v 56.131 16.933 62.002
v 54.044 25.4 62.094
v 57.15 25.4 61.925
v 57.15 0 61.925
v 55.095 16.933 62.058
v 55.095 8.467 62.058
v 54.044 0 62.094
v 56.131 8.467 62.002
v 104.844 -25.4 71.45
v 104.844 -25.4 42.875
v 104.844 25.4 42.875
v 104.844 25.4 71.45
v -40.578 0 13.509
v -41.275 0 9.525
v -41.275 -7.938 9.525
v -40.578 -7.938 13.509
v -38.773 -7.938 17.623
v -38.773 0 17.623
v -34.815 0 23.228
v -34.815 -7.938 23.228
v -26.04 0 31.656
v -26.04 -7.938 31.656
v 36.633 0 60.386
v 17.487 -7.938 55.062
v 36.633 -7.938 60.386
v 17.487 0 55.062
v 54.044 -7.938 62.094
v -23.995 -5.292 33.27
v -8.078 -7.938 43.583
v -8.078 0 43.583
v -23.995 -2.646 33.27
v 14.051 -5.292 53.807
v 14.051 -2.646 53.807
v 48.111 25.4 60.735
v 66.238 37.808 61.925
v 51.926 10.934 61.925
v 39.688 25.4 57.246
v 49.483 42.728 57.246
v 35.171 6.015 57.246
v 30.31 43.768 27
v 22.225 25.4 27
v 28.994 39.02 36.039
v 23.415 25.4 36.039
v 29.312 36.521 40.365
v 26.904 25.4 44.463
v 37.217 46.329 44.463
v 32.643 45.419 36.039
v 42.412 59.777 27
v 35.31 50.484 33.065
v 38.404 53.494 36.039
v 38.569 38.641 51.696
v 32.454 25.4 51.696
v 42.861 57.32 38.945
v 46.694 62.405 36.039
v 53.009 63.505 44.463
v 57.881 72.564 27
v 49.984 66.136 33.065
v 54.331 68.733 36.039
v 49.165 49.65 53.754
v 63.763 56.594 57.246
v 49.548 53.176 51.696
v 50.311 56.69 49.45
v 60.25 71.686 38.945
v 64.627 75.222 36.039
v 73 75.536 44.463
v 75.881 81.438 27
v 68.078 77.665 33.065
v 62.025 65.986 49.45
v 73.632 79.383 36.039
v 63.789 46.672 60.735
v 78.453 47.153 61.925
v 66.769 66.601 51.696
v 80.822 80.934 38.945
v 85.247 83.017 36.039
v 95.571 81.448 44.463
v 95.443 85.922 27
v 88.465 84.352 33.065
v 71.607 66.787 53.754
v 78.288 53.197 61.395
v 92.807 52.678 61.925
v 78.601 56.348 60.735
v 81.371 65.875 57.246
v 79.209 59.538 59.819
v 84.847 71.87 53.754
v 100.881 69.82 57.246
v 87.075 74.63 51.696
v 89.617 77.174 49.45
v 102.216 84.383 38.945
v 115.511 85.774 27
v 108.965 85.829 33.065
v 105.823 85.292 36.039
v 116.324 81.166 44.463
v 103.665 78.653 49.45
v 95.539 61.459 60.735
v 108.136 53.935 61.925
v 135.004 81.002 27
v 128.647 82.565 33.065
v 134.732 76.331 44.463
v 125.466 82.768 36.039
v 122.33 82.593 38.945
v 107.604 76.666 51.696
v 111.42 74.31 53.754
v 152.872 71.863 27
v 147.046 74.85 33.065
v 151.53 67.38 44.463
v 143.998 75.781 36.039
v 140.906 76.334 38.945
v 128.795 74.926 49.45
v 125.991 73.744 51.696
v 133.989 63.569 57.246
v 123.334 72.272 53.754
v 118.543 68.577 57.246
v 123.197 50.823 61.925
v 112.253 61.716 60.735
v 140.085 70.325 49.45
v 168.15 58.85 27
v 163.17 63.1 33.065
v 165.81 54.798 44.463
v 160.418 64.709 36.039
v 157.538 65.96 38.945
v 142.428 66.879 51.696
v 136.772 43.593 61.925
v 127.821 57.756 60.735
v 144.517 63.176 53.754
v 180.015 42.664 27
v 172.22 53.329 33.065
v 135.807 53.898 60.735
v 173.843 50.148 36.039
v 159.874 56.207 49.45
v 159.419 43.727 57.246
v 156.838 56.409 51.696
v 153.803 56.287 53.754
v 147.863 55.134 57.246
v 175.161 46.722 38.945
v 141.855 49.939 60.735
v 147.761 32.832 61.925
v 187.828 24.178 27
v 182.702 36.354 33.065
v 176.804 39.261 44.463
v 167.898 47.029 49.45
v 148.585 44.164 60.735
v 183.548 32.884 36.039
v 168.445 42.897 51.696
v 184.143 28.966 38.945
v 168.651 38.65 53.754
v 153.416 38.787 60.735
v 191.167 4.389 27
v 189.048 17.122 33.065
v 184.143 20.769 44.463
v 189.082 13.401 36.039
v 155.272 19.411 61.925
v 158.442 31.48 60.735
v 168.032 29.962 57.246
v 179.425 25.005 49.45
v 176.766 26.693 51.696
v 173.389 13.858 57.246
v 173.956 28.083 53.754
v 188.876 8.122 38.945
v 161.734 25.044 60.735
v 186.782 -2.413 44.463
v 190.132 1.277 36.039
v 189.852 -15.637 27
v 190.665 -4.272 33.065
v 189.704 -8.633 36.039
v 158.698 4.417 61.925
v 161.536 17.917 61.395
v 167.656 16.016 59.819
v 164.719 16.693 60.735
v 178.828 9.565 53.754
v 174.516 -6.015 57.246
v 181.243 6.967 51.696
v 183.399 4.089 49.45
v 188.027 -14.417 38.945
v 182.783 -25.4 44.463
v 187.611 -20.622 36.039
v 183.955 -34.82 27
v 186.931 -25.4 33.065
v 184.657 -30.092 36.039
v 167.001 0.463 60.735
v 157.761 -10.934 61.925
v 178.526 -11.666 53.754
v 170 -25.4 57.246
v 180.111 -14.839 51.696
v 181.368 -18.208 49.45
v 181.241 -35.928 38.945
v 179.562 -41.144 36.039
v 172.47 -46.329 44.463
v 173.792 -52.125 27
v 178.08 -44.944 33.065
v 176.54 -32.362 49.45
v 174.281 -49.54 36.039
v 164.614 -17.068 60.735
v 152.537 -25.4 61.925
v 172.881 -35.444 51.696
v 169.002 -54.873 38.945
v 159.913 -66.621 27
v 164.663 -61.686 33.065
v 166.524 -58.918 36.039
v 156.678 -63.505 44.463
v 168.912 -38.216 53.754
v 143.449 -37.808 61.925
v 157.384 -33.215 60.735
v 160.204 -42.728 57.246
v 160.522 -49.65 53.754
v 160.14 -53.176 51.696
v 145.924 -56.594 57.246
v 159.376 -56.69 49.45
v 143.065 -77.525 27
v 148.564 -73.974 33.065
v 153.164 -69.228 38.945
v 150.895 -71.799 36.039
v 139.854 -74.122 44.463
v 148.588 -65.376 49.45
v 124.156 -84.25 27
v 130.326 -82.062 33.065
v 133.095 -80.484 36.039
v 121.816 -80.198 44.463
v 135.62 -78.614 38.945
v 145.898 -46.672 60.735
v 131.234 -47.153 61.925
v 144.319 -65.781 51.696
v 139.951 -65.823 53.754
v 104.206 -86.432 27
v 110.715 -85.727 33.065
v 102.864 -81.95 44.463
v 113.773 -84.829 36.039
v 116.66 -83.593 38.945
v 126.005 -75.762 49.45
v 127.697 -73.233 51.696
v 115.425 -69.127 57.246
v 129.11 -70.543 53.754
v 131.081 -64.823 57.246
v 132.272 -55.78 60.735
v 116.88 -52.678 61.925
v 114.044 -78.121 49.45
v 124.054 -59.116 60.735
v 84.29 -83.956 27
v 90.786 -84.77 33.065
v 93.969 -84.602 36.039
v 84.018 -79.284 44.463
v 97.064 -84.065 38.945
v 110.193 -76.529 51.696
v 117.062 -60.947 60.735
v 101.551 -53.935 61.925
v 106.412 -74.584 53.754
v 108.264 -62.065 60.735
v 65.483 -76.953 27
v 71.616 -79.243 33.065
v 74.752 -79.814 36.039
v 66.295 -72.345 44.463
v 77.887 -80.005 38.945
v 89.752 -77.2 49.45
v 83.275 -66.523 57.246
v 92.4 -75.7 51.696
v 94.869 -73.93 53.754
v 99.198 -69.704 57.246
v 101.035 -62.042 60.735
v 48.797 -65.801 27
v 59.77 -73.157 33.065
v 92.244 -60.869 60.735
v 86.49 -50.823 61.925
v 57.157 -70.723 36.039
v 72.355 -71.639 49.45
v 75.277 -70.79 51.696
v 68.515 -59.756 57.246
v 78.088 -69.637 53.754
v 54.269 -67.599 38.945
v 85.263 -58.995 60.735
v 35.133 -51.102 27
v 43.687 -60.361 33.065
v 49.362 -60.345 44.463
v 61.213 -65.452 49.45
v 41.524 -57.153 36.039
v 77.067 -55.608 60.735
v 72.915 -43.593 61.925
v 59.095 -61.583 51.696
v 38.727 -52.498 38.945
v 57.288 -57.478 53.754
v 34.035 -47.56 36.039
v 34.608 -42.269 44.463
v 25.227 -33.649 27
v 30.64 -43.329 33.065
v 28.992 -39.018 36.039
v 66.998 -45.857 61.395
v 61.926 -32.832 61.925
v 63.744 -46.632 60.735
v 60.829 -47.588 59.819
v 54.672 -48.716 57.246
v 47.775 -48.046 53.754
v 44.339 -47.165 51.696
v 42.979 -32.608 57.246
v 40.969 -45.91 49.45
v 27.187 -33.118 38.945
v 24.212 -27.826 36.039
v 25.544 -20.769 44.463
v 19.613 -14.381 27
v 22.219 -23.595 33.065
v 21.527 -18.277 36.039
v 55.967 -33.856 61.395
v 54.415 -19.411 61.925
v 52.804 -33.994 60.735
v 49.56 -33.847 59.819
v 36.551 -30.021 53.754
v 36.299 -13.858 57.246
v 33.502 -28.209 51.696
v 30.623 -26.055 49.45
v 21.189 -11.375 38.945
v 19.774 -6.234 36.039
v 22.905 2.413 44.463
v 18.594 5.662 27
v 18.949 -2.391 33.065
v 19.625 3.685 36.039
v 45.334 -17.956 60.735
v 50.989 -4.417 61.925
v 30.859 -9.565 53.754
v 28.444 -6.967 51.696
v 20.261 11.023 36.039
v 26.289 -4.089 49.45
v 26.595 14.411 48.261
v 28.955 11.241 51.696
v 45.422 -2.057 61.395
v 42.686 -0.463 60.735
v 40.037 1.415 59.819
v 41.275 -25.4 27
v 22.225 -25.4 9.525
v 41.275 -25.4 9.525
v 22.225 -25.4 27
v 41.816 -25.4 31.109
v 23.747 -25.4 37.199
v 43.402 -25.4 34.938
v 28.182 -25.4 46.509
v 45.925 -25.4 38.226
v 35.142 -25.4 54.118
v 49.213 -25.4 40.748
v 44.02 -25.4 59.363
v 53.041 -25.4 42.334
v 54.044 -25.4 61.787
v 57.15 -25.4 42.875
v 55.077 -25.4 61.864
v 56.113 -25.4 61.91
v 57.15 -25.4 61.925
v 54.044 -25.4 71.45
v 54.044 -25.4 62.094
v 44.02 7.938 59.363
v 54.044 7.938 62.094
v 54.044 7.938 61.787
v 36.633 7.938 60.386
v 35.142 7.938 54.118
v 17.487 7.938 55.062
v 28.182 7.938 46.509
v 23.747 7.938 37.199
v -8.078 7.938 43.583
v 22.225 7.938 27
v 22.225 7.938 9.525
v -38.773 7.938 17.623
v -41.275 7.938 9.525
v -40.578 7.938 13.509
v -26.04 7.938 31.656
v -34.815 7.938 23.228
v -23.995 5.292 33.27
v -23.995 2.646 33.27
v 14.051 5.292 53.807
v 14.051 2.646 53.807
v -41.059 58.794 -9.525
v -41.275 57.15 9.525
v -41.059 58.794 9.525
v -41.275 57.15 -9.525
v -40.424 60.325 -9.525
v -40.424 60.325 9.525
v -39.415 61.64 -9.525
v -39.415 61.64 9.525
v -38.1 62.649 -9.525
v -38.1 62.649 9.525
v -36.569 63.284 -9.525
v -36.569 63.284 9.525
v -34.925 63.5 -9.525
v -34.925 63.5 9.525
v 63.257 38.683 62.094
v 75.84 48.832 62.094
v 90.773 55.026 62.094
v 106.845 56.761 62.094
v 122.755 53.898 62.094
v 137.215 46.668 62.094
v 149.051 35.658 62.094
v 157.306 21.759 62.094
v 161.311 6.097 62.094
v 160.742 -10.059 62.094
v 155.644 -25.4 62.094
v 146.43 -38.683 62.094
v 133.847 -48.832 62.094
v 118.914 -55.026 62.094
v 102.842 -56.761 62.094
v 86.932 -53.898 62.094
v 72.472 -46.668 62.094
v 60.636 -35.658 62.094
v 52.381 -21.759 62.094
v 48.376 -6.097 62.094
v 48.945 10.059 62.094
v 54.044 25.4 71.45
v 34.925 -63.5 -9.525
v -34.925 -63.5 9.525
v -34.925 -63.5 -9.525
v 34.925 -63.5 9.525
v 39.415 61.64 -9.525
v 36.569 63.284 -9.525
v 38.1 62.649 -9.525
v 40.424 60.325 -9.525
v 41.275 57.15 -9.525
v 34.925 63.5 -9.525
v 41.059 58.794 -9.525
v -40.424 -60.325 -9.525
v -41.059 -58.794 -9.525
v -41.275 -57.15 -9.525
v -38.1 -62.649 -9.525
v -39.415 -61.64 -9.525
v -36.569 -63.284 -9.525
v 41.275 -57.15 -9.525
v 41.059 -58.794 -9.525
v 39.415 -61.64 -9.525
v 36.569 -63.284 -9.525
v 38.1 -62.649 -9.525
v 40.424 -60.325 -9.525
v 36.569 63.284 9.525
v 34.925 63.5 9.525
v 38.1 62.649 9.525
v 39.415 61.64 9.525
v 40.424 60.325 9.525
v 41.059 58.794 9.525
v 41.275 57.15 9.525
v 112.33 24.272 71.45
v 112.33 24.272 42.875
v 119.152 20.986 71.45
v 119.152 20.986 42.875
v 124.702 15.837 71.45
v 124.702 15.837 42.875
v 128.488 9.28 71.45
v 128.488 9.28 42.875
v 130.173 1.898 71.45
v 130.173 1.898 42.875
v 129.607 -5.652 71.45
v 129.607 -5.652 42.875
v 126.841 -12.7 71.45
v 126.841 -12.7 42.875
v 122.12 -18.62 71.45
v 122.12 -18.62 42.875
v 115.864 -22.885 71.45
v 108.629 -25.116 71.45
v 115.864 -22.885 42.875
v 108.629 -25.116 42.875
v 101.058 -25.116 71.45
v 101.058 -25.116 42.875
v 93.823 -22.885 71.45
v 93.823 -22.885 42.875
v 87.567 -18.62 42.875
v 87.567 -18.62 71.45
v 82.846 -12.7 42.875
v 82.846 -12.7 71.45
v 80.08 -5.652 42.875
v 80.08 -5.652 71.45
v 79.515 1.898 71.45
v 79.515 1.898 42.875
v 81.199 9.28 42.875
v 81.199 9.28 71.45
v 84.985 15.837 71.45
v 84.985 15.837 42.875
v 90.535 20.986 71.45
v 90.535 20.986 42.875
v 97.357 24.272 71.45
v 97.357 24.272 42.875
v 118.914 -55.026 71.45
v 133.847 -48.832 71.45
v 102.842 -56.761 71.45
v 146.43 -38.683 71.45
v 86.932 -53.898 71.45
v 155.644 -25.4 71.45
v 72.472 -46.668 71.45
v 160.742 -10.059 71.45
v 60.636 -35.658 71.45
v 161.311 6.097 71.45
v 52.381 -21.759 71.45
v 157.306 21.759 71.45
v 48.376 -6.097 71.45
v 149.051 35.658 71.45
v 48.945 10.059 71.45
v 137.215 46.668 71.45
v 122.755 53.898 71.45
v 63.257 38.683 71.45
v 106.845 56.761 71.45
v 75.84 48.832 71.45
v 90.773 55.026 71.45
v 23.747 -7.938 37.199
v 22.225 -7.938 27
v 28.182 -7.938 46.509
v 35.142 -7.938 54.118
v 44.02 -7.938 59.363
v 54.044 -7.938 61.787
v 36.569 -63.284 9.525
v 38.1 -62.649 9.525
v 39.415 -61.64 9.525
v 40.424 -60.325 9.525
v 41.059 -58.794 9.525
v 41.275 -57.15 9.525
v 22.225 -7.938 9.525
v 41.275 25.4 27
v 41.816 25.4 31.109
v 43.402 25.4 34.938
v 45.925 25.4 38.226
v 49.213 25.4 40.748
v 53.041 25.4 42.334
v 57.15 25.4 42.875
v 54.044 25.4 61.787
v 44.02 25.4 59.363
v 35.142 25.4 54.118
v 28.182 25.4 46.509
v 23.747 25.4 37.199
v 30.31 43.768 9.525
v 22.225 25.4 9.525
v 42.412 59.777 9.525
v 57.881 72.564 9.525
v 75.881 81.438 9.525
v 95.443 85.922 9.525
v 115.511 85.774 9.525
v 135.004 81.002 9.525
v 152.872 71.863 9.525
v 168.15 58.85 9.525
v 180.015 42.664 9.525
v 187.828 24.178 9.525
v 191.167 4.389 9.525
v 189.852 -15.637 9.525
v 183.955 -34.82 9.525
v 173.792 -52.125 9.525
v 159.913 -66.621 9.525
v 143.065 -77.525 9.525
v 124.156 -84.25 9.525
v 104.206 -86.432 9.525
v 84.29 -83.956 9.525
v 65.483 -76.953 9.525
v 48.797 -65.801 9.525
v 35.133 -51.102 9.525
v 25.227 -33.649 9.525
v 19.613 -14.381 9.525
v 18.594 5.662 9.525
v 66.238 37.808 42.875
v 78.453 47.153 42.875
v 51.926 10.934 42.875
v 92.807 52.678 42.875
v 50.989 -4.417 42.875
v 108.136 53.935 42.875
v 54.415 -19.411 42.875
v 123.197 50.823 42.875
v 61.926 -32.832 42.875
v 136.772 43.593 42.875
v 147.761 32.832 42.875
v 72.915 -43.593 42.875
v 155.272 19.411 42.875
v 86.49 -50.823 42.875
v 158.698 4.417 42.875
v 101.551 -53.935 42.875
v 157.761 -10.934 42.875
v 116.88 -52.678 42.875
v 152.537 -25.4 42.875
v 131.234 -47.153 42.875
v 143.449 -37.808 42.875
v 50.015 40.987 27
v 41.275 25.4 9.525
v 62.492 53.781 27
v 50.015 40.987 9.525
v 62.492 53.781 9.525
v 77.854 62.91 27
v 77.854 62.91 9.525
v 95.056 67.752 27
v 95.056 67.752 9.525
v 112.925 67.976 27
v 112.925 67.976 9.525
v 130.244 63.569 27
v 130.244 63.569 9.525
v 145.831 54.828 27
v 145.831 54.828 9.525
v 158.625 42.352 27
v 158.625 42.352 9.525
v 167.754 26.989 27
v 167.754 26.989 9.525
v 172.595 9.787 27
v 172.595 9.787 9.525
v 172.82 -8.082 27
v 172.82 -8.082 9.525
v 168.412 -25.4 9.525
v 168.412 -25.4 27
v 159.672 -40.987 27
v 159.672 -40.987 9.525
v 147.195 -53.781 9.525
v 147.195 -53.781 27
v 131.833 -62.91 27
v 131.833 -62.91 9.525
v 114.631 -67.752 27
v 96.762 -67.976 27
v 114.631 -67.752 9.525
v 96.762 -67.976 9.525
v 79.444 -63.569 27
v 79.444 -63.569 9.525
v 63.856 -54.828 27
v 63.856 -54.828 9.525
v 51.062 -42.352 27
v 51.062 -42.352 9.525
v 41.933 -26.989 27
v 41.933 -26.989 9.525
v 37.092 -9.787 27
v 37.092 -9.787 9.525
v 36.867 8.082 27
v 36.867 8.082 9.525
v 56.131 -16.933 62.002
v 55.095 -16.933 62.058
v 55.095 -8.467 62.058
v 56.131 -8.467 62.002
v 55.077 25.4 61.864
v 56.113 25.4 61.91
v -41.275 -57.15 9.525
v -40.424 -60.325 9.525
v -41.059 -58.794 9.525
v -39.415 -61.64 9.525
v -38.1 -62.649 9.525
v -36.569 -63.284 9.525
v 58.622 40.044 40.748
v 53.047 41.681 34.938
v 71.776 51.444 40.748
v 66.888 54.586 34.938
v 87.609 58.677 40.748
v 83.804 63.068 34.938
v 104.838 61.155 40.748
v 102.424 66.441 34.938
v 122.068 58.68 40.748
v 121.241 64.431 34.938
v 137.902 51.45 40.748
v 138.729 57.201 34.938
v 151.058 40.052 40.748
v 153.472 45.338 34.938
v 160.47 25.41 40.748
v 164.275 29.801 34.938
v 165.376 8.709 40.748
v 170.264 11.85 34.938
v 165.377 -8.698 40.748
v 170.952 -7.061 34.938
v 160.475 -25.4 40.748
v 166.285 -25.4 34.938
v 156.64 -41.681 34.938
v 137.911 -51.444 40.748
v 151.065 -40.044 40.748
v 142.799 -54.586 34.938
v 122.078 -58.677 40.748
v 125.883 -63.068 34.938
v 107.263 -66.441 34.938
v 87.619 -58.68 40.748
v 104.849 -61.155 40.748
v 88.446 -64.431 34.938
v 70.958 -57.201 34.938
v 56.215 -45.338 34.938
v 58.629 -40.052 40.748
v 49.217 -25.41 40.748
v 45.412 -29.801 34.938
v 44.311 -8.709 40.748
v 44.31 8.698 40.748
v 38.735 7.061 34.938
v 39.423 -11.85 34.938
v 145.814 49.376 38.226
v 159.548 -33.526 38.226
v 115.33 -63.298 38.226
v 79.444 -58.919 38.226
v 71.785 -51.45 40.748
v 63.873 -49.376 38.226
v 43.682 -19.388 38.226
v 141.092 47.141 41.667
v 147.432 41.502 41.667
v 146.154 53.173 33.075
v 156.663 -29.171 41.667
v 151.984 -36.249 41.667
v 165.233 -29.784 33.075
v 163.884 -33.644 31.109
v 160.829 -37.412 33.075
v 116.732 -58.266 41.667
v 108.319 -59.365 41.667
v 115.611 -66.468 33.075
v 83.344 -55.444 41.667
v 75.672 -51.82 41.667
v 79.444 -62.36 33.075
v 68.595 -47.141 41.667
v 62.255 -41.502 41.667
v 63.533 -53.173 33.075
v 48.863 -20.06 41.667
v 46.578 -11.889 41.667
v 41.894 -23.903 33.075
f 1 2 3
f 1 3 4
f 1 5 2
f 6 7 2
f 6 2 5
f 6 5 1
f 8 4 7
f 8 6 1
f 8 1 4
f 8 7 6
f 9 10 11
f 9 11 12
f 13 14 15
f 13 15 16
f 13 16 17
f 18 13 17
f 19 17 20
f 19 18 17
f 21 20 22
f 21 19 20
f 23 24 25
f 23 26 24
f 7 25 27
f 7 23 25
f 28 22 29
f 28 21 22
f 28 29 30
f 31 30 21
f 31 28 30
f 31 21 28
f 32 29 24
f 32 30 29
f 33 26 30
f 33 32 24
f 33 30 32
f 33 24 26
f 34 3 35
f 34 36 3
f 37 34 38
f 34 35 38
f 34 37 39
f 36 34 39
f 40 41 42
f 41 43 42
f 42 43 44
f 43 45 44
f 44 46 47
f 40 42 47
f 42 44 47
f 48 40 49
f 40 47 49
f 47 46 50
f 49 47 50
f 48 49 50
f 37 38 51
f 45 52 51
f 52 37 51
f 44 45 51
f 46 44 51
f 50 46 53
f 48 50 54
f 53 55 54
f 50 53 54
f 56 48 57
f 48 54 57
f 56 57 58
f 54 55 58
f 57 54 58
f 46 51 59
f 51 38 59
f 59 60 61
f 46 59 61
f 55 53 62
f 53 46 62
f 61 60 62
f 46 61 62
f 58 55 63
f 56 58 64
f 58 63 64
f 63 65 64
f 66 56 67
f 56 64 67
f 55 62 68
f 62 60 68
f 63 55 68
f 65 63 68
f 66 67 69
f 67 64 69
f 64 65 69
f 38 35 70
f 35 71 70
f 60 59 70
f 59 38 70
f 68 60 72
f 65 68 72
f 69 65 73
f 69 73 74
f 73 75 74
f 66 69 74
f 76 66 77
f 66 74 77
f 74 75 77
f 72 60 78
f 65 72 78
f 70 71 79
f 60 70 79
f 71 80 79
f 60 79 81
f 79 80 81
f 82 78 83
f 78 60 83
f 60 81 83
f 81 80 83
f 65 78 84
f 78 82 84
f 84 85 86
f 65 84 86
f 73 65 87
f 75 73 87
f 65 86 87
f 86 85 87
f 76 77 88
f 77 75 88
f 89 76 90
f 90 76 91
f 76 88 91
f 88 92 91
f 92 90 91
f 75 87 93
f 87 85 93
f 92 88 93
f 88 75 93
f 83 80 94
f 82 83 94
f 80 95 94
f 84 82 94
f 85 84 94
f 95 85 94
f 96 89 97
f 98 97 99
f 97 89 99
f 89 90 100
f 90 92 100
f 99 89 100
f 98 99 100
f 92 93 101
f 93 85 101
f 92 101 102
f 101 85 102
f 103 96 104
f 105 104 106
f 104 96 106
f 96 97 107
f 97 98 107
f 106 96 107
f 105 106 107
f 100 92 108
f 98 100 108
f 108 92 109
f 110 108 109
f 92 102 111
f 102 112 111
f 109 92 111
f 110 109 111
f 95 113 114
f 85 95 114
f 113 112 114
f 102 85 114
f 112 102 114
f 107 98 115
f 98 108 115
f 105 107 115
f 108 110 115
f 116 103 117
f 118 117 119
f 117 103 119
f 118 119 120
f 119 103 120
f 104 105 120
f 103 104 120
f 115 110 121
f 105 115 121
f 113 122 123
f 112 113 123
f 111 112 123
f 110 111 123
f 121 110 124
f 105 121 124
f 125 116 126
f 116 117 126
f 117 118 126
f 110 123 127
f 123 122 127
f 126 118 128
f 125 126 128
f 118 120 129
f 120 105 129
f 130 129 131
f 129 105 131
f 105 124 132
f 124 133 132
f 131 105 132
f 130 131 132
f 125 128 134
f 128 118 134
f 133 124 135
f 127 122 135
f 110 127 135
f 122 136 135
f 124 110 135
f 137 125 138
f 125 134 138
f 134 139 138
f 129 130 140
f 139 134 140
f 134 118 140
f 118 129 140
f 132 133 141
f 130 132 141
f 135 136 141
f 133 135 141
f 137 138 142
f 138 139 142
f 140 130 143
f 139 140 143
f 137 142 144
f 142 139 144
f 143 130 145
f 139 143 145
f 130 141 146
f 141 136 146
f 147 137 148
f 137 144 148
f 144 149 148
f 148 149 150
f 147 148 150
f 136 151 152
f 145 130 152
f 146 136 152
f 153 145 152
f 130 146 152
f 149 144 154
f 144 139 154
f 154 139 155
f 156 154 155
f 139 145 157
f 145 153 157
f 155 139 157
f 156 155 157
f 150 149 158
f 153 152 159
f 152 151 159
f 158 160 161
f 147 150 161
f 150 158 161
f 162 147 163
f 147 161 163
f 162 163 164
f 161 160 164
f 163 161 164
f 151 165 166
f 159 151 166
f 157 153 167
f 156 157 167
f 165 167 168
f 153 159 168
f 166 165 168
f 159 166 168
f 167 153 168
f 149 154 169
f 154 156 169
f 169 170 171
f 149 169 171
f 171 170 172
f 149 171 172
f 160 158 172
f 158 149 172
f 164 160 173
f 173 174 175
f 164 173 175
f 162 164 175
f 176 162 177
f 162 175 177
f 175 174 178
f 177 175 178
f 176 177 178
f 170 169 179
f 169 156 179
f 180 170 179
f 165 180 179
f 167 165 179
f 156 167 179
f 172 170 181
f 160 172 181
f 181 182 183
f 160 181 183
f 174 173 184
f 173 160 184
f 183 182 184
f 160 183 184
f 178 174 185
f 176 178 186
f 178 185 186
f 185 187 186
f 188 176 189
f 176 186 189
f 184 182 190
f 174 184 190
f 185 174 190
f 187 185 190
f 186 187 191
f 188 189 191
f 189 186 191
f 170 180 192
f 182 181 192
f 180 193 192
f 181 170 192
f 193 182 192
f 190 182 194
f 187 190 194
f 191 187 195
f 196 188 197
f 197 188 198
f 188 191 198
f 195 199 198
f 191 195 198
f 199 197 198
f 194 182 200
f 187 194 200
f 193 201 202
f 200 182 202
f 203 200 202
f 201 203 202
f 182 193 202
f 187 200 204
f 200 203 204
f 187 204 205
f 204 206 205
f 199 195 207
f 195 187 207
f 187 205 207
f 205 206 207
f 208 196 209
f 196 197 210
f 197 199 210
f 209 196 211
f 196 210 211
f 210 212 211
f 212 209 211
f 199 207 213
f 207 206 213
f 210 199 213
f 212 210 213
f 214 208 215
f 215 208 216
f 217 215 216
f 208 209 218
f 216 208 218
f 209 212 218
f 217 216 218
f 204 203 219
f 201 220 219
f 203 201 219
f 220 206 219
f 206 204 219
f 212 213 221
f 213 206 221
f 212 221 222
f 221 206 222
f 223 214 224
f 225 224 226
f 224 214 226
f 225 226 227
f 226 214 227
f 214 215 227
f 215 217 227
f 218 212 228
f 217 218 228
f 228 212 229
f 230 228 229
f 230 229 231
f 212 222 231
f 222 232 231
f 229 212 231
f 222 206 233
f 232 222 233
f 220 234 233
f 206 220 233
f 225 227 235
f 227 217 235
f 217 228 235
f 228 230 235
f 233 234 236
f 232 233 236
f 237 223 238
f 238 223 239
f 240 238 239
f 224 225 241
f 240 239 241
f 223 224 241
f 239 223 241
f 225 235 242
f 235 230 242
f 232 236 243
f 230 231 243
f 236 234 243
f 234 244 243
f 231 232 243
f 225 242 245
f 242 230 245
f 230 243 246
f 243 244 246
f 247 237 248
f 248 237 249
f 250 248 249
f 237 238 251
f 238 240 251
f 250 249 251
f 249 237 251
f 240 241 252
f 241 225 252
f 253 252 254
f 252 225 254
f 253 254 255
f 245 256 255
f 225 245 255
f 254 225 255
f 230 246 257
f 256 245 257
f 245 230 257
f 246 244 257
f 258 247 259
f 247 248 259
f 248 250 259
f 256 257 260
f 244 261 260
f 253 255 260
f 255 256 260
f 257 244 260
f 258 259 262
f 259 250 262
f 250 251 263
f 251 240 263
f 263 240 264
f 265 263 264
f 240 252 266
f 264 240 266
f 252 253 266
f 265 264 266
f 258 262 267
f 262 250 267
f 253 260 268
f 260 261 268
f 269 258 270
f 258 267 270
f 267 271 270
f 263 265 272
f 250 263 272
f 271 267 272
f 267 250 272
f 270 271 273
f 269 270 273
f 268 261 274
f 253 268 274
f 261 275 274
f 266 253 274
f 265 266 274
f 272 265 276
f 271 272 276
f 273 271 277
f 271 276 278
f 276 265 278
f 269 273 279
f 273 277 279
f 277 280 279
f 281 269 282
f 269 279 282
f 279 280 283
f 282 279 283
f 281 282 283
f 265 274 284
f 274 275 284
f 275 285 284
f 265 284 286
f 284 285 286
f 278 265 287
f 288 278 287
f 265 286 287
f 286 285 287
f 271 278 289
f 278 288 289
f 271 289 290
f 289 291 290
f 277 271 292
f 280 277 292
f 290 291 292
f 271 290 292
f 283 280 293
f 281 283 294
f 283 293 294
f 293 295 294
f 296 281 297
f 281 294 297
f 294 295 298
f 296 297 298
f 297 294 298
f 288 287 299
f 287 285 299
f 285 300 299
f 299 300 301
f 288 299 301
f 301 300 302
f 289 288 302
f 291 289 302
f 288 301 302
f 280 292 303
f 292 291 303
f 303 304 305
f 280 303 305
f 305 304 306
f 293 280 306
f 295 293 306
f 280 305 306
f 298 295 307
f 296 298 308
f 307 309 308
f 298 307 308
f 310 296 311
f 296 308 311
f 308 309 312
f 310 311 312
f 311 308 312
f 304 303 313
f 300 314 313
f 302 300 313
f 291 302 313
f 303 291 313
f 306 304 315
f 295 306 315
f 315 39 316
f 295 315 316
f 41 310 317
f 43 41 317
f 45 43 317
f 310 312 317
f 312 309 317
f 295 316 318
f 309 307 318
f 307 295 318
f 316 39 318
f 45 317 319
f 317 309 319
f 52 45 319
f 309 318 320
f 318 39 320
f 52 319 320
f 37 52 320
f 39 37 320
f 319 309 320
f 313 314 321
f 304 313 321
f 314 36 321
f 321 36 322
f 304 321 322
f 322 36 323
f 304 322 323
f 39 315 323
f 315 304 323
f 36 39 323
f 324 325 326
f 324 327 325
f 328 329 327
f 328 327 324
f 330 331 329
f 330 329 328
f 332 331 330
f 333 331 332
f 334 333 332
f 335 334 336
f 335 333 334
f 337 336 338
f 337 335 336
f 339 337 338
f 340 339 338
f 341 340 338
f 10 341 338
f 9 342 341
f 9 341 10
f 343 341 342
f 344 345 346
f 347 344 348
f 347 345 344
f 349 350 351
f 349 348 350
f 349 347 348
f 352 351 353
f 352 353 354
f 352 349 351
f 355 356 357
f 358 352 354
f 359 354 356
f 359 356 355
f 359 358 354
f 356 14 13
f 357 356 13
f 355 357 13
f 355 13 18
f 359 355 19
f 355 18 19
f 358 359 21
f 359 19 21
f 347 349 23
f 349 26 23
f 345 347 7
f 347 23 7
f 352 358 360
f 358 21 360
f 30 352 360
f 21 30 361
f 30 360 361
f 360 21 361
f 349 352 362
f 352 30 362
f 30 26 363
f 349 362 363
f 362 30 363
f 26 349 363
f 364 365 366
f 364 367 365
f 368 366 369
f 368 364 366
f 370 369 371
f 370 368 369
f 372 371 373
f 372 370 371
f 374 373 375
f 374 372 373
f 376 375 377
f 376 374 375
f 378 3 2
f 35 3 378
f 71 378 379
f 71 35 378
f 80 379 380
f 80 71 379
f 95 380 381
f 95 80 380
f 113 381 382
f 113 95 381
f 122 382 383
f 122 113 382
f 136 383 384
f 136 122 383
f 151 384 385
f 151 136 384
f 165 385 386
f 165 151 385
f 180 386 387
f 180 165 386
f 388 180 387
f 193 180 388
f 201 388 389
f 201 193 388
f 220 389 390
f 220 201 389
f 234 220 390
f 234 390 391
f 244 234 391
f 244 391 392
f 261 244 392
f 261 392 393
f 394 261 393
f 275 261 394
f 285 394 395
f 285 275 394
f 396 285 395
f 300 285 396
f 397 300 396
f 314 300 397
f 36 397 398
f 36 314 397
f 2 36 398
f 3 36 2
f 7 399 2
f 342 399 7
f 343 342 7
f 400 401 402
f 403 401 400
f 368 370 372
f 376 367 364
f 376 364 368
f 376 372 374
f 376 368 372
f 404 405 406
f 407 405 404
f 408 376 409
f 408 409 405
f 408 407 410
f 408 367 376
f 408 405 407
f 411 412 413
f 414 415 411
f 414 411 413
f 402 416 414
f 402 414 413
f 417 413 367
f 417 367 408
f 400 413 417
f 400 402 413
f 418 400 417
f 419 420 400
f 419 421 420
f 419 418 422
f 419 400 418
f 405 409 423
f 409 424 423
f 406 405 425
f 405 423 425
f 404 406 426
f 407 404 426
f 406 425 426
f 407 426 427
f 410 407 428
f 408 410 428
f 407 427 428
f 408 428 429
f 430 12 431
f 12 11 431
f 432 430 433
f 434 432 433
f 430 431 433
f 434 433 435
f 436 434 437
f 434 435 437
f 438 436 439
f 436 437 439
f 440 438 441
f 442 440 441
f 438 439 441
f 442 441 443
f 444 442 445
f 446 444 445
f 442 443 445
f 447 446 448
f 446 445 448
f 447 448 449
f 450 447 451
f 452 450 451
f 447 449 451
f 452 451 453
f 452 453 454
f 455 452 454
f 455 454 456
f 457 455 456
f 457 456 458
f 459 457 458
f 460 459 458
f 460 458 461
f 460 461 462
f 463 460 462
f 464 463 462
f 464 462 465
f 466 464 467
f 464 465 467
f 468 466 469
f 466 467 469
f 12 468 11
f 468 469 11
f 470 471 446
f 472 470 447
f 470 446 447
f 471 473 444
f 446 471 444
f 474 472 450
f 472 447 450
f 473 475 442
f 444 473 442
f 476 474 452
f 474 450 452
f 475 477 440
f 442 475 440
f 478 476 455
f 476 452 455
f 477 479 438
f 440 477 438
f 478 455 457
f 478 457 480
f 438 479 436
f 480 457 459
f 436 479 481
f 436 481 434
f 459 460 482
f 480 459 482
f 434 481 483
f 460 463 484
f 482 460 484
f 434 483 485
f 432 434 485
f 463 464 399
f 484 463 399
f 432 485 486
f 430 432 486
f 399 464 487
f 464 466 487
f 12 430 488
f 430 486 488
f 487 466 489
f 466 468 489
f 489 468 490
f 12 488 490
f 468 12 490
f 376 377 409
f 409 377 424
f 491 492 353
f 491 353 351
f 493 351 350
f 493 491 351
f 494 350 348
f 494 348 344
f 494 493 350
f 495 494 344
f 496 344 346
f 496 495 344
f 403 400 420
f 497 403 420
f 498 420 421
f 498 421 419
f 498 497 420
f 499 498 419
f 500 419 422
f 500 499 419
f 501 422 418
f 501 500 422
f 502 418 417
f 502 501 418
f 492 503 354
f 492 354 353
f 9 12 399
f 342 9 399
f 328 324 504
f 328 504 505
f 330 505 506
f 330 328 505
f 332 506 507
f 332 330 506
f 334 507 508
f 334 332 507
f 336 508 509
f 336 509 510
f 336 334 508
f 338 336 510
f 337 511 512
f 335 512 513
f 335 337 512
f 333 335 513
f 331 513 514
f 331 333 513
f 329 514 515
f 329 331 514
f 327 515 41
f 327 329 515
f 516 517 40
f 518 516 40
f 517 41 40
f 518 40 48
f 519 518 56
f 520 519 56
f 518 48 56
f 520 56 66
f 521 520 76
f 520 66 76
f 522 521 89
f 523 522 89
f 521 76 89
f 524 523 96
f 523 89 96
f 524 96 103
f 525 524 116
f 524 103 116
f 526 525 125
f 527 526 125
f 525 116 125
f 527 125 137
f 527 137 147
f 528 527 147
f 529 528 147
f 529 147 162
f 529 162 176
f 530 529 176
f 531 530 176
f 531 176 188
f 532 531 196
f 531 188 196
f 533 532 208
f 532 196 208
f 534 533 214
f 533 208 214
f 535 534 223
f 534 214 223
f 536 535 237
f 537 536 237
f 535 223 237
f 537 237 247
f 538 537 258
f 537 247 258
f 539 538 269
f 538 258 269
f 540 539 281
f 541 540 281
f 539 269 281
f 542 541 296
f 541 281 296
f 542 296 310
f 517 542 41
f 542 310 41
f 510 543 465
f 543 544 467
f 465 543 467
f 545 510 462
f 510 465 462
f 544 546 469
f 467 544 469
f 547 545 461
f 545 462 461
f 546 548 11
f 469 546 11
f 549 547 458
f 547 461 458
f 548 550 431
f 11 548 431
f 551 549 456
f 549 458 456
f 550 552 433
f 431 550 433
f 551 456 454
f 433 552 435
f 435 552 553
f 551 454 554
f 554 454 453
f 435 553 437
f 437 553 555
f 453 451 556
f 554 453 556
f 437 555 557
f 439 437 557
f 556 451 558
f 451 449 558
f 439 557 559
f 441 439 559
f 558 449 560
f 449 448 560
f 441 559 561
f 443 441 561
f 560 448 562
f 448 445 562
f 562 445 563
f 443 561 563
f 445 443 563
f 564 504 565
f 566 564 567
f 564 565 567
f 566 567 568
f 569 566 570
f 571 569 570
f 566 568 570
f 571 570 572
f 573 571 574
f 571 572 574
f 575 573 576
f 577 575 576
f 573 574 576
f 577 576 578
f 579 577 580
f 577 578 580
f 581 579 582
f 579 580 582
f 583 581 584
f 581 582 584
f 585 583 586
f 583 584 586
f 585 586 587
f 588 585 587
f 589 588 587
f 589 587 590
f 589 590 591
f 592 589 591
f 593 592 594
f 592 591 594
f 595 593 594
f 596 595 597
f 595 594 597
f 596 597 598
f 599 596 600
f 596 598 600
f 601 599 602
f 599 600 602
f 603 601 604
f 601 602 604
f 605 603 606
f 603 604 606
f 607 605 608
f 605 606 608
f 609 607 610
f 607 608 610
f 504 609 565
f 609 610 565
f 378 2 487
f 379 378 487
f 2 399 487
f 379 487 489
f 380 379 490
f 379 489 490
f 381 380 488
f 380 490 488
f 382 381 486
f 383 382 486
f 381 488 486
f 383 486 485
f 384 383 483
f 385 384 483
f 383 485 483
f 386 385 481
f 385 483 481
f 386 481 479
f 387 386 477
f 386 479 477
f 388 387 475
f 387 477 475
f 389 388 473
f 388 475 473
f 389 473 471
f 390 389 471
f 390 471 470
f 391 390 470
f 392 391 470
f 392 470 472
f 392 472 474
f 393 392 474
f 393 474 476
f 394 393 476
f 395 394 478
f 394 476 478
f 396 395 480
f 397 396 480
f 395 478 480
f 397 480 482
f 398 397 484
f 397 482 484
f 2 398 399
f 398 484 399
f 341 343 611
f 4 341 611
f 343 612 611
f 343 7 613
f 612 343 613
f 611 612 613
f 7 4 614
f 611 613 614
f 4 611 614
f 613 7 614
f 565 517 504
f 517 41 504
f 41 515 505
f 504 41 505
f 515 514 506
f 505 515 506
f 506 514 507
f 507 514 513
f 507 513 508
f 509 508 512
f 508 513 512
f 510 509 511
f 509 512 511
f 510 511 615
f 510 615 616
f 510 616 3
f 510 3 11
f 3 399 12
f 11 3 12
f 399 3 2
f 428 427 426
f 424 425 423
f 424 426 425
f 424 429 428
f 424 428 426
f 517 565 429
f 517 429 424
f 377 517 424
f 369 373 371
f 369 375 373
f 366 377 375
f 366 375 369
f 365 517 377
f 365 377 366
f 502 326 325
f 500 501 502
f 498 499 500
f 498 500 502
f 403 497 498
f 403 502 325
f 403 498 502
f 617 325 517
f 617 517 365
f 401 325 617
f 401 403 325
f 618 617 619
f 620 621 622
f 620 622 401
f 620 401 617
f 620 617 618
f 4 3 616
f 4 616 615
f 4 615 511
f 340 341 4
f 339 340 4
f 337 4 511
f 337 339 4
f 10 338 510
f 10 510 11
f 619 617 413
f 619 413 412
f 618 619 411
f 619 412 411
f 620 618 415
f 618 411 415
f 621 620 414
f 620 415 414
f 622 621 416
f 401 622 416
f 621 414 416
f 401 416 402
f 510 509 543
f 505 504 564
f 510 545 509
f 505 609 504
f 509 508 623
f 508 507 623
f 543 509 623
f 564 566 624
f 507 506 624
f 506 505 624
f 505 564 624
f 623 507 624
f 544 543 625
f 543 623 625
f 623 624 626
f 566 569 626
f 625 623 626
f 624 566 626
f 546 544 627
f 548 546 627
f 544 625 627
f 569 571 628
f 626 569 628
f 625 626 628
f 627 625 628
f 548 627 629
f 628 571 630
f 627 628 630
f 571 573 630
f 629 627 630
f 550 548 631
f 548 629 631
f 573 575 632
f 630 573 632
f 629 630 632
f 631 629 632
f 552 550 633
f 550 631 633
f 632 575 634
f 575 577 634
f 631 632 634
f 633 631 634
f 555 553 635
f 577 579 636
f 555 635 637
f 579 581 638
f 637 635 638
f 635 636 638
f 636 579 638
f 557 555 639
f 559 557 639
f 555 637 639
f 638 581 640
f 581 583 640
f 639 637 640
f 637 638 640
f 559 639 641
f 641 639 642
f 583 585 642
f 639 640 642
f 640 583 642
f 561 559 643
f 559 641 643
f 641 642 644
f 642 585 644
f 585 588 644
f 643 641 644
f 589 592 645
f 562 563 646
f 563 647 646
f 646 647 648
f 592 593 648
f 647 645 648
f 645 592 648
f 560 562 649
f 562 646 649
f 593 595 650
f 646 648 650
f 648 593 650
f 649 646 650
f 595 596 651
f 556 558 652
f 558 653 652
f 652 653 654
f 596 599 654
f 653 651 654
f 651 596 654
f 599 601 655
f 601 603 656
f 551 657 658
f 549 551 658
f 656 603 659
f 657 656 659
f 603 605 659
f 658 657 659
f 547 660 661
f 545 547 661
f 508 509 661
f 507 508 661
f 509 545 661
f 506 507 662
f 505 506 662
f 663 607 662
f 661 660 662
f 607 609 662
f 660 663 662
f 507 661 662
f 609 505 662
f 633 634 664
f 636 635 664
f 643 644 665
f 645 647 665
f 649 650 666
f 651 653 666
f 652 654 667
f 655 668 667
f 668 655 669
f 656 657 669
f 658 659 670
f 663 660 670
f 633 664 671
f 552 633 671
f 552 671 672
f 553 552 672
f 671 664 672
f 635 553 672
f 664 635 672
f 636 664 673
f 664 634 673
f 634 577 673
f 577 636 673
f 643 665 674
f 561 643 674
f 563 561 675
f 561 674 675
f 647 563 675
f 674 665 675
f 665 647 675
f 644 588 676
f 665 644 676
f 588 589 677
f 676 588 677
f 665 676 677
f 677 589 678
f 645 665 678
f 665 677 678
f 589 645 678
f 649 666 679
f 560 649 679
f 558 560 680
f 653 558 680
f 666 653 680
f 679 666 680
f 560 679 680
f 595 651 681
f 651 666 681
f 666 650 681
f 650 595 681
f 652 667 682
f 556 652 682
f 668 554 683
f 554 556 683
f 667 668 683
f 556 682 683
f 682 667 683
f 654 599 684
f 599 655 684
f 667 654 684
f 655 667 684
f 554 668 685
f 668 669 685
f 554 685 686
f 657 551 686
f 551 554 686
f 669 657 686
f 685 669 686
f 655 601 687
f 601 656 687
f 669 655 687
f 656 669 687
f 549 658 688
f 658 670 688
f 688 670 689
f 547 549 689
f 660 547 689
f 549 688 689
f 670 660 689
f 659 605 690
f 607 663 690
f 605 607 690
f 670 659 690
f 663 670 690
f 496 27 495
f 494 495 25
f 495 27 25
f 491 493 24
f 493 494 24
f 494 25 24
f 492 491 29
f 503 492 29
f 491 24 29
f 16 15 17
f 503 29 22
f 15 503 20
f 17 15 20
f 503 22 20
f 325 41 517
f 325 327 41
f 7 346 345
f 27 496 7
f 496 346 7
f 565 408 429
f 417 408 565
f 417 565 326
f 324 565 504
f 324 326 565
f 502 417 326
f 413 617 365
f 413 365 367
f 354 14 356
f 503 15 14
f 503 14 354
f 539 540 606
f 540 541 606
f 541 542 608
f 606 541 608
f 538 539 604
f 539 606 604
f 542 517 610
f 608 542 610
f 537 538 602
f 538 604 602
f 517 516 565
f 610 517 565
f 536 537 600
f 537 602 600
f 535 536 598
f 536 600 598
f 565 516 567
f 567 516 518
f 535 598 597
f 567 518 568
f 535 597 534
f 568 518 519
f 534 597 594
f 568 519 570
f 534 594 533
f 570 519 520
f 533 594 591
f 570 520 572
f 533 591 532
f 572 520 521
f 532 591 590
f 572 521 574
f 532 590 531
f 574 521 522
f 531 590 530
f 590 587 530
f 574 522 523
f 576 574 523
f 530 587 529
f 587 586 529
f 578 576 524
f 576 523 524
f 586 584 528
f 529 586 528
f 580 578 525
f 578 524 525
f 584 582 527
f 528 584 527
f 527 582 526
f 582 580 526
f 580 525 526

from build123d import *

# Parameters (mm, degrees)
F1_DEPTH = 63.5
F2_DEPTH = 25.4
F3_DEPTH = 7.9375
F5_R     = 6.35


with BuildPart() as f1:
    # F0 (on Front) → F1 (new body, symmetric)
    with BuildSketch(Plane.XZ):
        Polygon((-41.275, 9.525), (-41.275, -9.525), (41.275, -9.525), (41.275, 9.525), (22.225, 9.525), align=None)
    extrude(amount=F1_DEPTH, both=True)

    # F0 (on Front) → F2 (join, symmetric)
    with BuildSketch(Plane.XZ):
        with BuildLine():
            Line((22.225, 9.525), (41.275, 9.525))
            Line((41.275, 9.525), (41.275, 27.0002))
            ThreePointArc((41.275, 27.0002), (45.92468, 38.22552), (57.15, 42.8752))
            Line((57.15, 42.8752), (54.043531, 42.8752))
            Line((54.043531, 42.8752), (54.043531, 61.78677))
            ThreePointArc((54.043531, 61.78677), (31.379386, 50.572028), (22.225, 27.0002))
            Line((22.225, 27.0002), (22.225, 9.525))
        make_face()
        with BuildLine():
            Line((54.043531, 71.4502), (54.043531, 62.093948))
            add(Edge.make_bspline(
                [(54.043531, 62.093948), (55.103452, 62.067899), (56.139747, 62.012036), (57.15, 61.9252)],
                knots=[108.198814, 108.198814, 108.198814, 108.198814, 111.504536, 111.504536, 111.504536, 111.504536], degree=3))
            ThreePointArc((57.15, 61.9252), (55.595224, 61.890575), (54.043531, 61.78677))
            Line((54.043531, 61.78677), (54.043531, 42.8752))
            Line((54.043531, 42.8752), (57.15, 42.8752))
            Line((57.15, 42.8752), (78.274319, 42.8752))
            Line((78.274319, 42.8752), (104.843531, 42.8752))
            Line((104.843531, 42.8752), (104.843531, 71.4502))
            Line((104.843531, 71.4502), (54.043531, 71.4502))
        make_face()
    extrude(amount=F2_DEPTH, both=True)

    # F5
    f5_edges = [f1.edges().sort_by_distance(p)[0] for p in [
        (41.275, -63.5, 0),
        (-41.275, -63.5, 0),
        (41.275, 63.5, 0),
        (-41.275, 63.5, 0),
    ]]
    fillet(f5_edges, radius=F5_R)


with BuildPart() as f3:
    # F0 (on Front) → F3 (new body, symmetric)
    with BuildSketch(Plane.XZ):
        with BuildLine():
            add(Edge.make_bspline(
                [(-41.275, 9.525), (-40.651195, 31.860137), (19.351508, 62.946558), (54.043531, 62.093948)],
                knots=[0, 0, 0, 0, 108.198814, 108.198814, 108.198814, 108.198814], degree=3))
            Line((-41.275, 9.525), (22.225, 9.525))
            Line((22.225, 9.525), (22.225, 27.0002))
            ThreePointArc((22.225, 27.0002), (31.379386, 50.572028), (54.043531, 61.78677))
            Line((54.043531, 61.78677), (54.043531, 62.093948))
        make_face()
    extrude(amount=F3_DEPTH, both=True)


with BuildPart() as f4:
    # F2_face (on face) → F4 (revolve)
    with BuildSketch(Plane(origin=(61.629494, 25.4, 48.016712), x_dir=(1, 0, 0), z_dir=(0, 1, 0))):
        with BuildLine():
            Line((-39.404494, 38.491712), (-39.404494, 21.016512))
            ThreePointArc((-39.404494, 21.016512), (-29.175198, -3.679192), (-4.479494, -13.908488))
            add(Edge.make_bspline(
                [(-7.585963, -14.077236), (-6.526042, -14.051187), (-5.489747, -13.995324), (-4.479494, -13.908488)],
                knots=[108.198814, 108.198814, 108.198814, 108.198814, 111.504536, 111.504536, 111.504536, 111.504536], degree=3))
            Line((-7.585963, -14.077236), (-7.585963, -23.433488))
            Line((-7.585963, -23.433488), (43.214037, -23.433488))
            Line((43.214037, -23.433488), (43.214037, 5.141512))
            Line((43.214037, 5.141512), (-4.479494, 5.141512))
            ThreePointArc((-4.479494, 5.141512), (-15.704814, 9.791192), (-20.354494, 21.016512))
            Line((-20.354494, 21.016512), (-20.354494, 38.491712))
            Line((-20.354494, 38.491712), (-39.404494, 38.491712))
        make_face()
    revolve(axis=Axis((104.843531, 0, 57.1627), (0, 0, -1)))


solid = Compound([f1.part, f3.part, f4.part])
